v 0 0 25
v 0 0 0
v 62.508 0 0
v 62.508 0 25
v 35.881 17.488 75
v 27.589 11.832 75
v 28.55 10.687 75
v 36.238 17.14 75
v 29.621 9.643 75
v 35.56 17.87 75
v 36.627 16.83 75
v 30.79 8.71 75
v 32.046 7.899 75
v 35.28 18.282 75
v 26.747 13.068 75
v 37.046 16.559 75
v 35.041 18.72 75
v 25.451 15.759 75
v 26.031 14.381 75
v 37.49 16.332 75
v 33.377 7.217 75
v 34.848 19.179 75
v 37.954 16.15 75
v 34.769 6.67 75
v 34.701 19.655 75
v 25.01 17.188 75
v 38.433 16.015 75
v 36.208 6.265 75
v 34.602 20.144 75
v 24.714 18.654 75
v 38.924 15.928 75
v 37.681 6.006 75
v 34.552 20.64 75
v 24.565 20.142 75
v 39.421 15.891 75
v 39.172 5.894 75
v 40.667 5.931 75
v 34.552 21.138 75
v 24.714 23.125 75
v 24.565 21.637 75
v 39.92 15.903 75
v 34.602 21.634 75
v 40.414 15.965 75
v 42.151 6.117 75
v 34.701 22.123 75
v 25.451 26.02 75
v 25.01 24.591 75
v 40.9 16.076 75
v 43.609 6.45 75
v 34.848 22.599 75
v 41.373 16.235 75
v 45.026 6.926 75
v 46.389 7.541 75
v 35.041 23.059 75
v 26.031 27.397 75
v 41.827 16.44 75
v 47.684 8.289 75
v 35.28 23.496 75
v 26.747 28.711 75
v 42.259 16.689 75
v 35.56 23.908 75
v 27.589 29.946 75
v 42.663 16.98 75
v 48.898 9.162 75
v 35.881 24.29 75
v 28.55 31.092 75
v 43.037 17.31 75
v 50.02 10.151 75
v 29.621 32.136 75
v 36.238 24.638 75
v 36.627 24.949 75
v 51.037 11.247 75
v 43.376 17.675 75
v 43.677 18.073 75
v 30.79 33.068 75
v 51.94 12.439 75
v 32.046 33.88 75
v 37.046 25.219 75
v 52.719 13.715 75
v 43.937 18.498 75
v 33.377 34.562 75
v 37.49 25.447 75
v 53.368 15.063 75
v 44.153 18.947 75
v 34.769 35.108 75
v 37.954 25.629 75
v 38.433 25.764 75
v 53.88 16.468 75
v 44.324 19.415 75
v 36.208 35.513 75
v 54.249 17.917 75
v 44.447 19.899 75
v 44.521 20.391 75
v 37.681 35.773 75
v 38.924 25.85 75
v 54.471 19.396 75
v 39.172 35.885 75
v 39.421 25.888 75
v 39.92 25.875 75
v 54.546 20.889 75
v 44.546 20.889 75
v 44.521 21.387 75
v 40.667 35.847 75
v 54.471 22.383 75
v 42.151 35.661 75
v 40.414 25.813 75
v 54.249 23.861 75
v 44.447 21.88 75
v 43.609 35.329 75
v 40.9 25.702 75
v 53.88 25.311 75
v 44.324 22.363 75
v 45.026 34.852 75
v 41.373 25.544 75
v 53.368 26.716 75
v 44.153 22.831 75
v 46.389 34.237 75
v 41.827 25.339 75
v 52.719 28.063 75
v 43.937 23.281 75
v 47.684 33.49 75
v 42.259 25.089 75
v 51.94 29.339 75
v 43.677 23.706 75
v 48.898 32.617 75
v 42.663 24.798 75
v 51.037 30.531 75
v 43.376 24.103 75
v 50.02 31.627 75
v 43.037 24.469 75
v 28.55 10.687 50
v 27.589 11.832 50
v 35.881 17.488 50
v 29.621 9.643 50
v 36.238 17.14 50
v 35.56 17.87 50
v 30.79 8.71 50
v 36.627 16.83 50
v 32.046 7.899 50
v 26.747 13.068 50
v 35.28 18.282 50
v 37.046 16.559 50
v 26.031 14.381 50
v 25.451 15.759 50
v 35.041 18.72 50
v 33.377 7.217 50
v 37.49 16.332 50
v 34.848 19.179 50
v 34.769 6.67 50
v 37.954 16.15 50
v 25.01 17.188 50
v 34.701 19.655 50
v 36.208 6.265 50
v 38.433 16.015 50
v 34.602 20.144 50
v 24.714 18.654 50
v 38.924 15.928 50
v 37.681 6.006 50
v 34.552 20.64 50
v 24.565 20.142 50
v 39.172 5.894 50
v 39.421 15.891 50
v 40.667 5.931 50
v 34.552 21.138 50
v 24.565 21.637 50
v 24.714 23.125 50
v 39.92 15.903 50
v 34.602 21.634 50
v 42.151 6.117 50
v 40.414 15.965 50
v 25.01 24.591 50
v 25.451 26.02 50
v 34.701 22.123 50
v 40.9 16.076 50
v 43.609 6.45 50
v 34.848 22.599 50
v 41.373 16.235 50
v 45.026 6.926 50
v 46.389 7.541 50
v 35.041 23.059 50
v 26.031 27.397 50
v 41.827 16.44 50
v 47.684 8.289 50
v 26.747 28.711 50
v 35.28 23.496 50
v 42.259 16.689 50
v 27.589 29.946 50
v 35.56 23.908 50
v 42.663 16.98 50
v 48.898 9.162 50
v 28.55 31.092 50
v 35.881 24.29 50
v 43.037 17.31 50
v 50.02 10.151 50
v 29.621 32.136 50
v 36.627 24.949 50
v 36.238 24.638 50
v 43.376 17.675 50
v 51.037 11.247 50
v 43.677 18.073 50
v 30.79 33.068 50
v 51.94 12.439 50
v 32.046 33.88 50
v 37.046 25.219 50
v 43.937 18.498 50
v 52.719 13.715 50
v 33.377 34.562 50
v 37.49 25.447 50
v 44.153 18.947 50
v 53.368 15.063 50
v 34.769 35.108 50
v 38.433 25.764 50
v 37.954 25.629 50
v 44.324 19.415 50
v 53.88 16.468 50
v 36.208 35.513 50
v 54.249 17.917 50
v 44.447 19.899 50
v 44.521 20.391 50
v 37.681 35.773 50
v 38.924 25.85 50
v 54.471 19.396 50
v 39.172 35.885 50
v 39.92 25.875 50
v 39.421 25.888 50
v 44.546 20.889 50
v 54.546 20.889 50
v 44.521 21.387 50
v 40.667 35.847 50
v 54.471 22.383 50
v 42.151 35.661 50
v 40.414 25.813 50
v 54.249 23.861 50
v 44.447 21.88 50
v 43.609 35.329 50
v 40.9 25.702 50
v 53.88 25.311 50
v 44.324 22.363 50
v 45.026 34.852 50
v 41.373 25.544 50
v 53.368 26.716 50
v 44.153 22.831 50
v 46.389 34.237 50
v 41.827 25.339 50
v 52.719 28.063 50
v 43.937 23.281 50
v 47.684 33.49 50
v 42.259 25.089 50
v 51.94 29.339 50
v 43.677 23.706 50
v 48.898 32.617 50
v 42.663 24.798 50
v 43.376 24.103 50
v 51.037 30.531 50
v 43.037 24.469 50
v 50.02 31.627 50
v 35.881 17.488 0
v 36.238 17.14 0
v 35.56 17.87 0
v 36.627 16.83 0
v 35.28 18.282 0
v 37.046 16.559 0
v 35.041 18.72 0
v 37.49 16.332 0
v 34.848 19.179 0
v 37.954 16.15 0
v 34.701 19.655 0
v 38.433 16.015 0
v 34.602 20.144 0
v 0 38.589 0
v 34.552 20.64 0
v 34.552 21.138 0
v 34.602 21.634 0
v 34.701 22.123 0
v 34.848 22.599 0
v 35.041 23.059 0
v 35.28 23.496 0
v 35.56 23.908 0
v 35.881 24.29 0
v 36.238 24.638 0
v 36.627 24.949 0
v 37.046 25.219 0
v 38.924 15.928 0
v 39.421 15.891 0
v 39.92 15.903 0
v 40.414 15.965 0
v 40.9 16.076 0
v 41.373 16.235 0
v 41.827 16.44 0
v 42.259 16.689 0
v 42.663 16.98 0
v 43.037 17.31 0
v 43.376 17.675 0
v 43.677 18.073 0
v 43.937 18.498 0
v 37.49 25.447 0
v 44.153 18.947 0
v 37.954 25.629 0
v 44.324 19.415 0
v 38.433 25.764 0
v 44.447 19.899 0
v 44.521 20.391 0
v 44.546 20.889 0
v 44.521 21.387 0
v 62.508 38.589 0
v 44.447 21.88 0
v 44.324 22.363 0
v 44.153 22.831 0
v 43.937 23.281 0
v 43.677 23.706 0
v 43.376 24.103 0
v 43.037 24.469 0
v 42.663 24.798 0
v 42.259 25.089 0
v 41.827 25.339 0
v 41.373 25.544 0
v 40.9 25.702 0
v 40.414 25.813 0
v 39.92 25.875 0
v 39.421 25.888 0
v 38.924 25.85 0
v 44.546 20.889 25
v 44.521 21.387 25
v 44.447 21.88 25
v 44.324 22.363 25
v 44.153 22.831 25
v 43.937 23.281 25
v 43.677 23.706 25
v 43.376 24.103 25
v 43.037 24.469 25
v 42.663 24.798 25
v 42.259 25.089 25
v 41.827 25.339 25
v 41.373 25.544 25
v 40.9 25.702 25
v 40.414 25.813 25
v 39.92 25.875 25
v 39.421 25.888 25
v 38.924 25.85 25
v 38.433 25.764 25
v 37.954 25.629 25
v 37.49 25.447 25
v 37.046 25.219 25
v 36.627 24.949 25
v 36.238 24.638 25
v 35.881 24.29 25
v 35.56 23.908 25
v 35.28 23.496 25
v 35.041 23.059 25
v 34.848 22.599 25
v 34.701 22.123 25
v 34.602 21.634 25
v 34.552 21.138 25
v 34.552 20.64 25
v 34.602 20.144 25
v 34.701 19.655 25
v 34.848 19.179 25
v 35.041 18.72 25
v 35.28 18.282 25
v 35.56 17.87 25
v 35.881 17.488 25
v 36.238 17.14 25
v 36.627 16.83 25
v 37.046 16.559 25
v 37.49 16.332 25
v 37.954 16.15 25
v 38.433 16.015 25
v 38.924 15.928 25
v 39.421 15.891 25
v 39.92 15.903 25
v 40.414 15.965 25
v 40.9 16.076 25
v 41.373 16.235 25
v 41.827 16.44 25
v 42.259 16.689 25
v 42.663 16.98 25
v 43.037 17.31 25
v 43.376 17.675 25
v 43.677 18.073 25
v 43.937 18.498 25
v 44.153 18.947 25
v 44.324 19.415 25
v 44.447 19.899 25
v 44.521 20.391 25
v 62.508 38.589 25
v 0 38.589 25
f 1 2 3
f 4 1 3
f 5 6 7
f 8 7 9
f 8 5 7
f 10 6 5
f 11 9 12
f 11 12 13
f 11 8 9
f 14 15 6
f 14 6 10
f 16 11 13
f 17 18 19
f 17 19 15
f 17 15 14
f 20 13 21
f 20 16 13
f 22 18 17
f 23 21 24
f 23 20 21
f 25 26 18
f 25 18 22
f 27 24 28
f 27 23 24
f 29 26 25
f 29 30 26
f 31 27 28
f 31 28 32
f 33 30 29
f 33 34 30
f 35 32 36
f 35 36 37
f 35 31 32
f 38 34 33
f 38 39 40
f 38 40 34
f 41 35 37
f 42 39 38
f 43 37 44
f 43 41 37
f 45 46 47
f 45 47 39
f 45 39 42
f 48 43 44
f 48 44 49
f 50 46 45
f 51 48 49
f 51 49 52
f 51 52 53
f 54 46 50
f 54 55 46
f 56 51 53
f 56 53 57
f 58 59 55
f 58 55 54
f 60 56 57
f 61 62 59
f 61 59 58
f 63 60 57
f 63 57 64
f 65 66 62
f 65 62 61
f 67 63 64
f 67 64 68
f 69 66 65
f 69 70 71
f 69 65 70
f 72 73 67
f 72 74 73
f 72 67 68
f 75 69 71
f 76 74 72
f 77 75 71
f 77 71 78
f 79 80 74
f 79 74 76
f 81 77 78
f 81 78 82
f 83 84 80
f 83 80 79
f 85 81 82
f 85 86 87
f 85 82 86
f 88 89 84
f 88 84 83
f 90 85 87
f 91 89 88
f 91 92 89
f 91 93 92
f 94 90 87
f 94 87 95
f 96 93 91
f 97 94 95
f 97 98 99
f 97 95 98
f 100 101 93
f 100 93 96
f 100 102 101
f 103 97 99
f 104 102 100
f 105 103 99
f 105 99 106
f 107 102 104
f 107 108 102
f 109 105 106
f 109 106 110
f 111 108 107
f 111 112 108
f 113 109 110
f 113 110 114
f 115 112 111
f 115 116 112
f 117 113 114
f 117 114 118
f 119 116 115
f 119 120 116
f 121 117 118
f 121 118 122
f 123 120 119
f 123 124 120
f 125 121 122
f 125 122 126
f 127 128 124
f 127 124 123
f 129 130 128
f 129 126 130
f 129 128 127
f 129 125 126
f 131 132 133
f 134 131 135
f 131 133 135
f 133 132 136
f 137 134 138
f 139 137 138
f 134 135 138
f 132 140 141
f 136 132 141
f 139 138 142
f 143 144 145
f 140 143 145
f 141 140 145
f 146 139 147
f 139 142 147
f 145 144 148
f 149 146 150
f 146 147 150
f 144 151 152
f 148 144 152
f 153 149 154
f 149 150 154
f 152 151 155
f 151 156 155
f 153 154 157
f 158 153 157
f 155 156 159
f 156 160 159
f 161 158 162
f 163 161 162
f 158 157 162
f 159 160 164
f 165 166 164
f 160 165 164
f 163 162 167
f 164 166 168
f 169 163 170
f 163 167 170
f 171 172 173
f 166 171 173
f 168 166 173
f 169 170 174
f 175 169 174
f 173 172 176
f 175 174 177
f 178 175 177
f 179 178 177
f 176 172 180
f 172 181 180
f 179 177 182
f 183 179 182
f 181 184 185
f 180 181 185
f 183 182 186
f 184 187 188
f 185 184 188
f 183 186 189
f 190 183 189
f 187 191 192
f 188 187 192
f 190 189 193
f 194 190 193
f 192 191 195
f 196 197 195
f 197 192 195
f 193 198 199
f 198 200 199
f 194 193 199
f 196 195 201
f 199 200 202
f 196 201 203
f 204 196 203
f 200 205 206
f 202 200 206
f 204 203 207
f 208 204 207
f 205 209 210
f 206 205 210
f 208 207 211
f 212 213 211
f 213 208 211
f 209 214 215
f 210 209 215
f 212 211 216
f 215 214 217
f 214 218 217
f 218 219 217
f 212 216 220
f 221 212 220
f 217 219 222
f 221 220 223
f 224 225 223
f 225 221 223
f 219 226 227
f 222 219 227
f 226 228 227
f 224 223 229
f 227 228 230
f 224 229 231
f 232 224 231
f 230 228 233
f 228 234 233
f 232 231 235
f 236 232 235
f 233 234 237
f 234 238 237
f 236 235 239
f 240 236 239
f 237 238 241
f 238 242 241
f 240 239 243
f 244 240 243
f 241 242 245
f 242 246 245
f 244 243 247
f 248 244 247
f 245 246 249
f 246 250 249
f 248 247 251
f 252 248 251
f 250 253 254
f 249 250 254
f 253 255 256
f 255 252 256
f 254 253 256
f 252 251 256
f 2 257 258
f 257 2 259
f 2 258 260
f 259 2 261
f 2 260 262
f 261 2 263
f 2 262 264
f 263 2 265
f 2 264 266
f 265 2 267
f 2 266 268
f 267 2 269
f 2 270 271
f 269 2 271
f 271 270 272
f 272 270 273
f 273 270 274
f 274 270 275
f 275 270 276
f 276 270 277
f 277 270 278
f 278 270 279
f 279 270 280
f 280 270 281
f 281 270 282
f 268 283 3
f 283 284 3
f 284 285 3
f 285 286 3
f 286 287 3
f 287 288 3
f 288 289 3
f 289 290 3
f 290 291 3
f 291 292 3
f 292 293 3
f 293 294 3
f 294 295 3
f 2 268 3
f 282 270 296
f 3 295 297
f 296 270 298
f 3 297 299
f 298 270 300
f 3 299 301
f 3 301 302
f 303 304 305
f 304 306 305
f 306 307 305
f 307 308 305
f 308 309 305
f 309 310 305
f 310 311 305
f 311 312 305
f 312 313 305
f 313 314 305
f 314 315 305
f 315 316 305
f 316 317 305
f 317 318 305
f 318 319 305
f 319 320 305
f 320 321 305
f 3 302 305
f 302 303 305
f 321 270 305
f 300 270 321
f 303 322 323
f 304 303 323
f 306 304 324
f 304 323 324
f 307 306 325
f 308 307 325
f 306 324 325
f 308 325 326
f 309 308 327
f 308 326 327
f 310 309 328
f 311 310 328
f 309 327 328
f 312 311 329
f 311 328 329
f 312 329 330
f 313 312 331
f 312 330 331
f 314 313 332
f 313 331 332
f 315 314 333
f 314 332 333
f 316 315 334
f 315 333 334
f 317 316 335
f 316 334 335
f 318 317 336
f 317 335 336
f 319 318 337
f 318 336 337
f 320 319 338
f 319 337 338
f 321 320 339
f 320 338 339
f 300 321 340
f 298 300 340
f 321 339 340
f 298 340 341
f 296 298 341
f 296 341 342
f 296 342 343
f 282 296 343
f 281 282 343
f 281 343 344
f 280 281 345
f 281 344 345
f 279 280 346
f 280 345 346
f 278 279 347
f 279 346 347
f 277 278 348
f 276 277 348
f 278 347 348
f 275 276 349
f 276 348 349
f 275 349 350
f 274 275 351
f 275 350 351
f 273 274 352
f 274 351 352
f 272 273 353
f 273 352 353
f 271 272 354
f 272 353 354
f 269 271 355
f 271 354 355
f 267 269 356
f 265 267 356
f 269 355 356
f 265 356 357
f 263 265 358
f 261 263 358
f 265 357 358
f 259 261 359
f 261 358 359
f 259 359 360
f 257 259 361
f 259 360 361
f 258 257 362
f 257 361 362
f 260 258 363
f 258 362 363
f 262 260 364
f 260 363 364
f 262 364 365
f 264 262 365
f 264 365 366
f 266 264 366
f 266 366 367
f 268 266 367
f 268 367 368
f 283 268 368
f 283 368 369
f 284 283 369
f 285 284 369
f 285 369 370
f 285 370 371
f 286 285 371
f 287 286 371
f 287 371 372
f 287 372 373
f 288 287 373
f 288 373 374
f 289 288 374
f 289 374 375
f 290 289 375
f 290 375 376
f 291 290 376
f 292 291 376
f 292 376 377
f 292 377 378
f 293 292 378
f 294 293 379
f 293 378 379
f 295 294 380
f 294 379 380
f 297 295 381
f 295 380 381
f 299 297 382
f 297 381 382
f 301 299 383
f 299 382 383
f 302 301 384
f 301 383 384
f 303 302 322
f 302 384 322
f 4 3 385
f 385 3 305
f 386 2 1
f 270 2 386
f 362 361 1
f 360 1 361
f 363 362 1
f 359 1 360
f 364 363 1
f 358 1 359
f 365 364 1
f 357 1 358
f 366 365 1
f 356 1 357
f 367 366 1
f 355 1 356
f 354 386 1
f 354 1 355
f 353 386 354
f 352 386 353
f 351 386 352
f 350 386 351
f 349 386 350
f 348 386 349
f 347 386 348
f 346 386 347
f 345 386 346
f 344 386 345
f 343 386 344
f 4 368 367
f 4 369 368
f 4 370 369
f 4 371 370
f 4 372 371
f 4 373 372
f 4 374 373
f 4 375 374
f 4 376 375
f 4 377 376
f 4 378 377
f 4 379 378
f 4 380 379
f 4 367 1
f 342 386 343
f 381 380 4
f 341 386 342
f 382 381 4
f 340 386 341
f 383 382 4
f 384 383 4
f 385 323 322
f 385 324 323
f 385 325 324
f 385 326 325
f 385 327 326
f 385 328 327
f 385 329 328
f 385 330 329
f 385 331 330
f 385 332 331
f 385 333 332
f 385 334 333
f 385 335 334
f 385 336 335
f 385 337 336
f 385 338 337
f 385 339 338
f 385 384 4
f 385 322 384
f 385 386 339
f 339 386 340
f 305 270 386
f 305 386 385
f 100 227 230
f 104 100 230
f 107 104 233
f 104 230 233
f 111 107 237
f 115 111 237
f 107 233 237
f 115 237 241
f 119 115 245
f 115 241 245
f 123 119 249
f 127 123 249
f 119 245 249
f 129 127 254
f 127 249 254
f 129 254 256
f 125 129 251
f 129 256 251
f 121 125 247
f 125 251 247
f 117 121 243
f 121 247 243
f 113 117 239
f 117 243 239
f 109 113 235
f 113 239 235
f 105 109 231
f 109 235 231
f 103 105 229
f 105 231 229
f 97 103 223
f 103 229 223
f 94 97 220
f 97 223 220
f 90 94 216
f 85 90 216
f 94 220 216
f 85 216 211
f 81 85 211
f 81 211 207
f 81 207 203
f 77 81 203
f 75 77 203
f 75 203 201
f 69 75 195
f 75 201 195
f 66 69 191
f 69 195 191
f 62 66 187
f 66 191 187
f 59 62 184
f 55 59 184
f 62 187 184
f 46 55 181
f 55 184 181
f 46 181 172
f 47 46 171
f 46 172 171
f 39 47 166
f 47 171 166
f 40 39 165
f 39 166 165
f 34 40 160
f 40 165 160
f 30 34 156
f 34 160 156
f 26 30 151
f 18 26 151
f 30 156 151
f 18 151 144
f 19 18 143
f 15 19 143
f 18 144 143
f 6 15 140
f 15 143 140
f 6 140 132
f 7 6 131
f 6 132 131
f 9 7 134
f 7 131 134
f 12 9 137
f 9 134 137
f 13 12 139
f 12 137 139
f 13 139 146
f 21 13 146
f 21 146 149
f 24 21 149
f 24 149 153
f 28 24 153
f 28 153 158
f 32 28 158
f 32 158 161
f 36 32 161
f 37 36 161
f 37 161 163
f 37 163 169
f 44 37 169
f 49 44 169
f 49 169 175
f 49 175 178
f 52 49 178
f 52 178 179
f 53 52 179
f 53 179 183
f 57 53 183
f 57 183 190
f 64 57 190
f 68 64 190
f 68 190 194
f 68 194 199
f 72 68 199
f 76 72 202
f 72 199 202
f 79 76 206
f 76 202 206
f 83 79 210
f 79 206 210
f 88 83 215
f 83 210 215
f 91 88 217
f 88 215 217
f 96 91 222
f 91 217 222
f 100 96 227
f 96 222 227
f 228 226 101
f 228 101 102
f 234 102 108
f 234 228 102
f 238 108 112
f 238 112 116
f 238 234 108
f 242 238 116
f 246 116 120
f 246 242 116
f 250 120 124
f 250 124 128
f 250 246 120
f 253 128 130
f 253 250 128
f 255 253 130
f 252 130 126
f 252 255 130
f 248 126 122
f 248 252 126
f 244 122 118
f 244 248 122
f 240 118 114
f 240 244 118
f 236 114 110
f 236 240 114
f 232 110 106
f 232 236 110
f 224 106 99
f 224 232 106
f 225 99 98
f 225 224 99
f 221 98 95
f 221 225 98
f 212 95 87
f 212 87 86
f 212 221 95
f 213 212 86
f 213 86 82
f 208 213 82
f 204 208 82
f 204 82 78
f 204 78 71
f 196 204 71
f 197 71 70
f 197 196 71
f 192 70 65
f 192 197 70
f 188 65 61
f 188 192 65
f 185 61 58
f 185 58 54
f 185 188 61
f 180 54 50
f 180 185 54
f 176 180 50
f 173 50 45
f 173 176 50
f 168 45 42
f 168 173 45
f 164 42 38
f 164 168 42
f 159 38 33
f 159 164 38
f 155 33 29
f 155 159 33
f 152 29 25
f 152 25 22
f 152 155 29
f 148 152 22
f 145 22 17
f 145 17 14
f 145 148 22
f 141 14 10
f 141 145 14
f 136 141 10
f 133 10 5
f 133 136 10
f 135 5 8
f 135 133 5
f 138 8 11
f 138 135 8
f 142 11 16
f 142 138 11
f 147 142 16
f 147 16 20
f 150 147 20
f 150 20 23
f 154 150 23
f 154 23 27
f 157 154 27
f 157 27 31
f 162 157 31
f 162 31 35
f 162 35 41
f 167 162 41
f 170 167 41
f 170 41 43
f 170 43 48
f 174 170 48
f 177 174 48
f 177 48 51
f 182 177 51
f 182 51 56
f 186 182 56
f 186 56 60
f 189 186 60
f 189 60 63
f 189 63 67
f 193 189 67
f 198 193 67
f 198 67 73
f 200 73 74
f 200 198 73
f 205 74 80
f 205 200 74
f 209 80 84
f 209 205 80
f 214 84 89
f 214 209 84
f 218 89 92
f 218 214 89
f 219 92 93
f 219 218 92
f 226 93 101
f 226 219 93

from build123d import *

# Parameters (mm, degrees)
F0_W     = 62.5082403421
F0_H     = 38.5892726481
F1_DEPTH = 25
F2_R     = 5
F3_DEPTH = 25
F5_R     = 15
F5_R_2   = 5
F6_DEPTH = 25


with BuildPart() as f1:
    # F0 (on Top) → F1 (new body)
    with BuildSketch(Plane.XY):
        with Locations((31.2541201711, 19.294636324)):
            Rectangle(F0_W, F0_H)
    extrude(amount=F1_DEPTH)

    # F2 (on face) → F3 (cut)
    with BuildSketch(Plane.XY.offset(25)):
        with Locations((39.5460315049, 20.8892356604)):
            Circle(F2_R)
    extrude(amount=-F3_DEPTH, mode=Mode.SUBTRACT)


with BuildPart() as f6:
    # F5 (on offset) → F6 (new body)
    with BuildSketch(Plane.XY.offset(50)):
        with Locations((39.5460315049, 20.8892356604)):
            Circle(F5_R)
        with Locations((39.5460315049, 20.8892356604)):
            Circle(F5_R_2, mode=Mode.SUBTRACT)
    extrude(amount=F6_DEPTH)


solid = Compound([f1.part, f6.part])
